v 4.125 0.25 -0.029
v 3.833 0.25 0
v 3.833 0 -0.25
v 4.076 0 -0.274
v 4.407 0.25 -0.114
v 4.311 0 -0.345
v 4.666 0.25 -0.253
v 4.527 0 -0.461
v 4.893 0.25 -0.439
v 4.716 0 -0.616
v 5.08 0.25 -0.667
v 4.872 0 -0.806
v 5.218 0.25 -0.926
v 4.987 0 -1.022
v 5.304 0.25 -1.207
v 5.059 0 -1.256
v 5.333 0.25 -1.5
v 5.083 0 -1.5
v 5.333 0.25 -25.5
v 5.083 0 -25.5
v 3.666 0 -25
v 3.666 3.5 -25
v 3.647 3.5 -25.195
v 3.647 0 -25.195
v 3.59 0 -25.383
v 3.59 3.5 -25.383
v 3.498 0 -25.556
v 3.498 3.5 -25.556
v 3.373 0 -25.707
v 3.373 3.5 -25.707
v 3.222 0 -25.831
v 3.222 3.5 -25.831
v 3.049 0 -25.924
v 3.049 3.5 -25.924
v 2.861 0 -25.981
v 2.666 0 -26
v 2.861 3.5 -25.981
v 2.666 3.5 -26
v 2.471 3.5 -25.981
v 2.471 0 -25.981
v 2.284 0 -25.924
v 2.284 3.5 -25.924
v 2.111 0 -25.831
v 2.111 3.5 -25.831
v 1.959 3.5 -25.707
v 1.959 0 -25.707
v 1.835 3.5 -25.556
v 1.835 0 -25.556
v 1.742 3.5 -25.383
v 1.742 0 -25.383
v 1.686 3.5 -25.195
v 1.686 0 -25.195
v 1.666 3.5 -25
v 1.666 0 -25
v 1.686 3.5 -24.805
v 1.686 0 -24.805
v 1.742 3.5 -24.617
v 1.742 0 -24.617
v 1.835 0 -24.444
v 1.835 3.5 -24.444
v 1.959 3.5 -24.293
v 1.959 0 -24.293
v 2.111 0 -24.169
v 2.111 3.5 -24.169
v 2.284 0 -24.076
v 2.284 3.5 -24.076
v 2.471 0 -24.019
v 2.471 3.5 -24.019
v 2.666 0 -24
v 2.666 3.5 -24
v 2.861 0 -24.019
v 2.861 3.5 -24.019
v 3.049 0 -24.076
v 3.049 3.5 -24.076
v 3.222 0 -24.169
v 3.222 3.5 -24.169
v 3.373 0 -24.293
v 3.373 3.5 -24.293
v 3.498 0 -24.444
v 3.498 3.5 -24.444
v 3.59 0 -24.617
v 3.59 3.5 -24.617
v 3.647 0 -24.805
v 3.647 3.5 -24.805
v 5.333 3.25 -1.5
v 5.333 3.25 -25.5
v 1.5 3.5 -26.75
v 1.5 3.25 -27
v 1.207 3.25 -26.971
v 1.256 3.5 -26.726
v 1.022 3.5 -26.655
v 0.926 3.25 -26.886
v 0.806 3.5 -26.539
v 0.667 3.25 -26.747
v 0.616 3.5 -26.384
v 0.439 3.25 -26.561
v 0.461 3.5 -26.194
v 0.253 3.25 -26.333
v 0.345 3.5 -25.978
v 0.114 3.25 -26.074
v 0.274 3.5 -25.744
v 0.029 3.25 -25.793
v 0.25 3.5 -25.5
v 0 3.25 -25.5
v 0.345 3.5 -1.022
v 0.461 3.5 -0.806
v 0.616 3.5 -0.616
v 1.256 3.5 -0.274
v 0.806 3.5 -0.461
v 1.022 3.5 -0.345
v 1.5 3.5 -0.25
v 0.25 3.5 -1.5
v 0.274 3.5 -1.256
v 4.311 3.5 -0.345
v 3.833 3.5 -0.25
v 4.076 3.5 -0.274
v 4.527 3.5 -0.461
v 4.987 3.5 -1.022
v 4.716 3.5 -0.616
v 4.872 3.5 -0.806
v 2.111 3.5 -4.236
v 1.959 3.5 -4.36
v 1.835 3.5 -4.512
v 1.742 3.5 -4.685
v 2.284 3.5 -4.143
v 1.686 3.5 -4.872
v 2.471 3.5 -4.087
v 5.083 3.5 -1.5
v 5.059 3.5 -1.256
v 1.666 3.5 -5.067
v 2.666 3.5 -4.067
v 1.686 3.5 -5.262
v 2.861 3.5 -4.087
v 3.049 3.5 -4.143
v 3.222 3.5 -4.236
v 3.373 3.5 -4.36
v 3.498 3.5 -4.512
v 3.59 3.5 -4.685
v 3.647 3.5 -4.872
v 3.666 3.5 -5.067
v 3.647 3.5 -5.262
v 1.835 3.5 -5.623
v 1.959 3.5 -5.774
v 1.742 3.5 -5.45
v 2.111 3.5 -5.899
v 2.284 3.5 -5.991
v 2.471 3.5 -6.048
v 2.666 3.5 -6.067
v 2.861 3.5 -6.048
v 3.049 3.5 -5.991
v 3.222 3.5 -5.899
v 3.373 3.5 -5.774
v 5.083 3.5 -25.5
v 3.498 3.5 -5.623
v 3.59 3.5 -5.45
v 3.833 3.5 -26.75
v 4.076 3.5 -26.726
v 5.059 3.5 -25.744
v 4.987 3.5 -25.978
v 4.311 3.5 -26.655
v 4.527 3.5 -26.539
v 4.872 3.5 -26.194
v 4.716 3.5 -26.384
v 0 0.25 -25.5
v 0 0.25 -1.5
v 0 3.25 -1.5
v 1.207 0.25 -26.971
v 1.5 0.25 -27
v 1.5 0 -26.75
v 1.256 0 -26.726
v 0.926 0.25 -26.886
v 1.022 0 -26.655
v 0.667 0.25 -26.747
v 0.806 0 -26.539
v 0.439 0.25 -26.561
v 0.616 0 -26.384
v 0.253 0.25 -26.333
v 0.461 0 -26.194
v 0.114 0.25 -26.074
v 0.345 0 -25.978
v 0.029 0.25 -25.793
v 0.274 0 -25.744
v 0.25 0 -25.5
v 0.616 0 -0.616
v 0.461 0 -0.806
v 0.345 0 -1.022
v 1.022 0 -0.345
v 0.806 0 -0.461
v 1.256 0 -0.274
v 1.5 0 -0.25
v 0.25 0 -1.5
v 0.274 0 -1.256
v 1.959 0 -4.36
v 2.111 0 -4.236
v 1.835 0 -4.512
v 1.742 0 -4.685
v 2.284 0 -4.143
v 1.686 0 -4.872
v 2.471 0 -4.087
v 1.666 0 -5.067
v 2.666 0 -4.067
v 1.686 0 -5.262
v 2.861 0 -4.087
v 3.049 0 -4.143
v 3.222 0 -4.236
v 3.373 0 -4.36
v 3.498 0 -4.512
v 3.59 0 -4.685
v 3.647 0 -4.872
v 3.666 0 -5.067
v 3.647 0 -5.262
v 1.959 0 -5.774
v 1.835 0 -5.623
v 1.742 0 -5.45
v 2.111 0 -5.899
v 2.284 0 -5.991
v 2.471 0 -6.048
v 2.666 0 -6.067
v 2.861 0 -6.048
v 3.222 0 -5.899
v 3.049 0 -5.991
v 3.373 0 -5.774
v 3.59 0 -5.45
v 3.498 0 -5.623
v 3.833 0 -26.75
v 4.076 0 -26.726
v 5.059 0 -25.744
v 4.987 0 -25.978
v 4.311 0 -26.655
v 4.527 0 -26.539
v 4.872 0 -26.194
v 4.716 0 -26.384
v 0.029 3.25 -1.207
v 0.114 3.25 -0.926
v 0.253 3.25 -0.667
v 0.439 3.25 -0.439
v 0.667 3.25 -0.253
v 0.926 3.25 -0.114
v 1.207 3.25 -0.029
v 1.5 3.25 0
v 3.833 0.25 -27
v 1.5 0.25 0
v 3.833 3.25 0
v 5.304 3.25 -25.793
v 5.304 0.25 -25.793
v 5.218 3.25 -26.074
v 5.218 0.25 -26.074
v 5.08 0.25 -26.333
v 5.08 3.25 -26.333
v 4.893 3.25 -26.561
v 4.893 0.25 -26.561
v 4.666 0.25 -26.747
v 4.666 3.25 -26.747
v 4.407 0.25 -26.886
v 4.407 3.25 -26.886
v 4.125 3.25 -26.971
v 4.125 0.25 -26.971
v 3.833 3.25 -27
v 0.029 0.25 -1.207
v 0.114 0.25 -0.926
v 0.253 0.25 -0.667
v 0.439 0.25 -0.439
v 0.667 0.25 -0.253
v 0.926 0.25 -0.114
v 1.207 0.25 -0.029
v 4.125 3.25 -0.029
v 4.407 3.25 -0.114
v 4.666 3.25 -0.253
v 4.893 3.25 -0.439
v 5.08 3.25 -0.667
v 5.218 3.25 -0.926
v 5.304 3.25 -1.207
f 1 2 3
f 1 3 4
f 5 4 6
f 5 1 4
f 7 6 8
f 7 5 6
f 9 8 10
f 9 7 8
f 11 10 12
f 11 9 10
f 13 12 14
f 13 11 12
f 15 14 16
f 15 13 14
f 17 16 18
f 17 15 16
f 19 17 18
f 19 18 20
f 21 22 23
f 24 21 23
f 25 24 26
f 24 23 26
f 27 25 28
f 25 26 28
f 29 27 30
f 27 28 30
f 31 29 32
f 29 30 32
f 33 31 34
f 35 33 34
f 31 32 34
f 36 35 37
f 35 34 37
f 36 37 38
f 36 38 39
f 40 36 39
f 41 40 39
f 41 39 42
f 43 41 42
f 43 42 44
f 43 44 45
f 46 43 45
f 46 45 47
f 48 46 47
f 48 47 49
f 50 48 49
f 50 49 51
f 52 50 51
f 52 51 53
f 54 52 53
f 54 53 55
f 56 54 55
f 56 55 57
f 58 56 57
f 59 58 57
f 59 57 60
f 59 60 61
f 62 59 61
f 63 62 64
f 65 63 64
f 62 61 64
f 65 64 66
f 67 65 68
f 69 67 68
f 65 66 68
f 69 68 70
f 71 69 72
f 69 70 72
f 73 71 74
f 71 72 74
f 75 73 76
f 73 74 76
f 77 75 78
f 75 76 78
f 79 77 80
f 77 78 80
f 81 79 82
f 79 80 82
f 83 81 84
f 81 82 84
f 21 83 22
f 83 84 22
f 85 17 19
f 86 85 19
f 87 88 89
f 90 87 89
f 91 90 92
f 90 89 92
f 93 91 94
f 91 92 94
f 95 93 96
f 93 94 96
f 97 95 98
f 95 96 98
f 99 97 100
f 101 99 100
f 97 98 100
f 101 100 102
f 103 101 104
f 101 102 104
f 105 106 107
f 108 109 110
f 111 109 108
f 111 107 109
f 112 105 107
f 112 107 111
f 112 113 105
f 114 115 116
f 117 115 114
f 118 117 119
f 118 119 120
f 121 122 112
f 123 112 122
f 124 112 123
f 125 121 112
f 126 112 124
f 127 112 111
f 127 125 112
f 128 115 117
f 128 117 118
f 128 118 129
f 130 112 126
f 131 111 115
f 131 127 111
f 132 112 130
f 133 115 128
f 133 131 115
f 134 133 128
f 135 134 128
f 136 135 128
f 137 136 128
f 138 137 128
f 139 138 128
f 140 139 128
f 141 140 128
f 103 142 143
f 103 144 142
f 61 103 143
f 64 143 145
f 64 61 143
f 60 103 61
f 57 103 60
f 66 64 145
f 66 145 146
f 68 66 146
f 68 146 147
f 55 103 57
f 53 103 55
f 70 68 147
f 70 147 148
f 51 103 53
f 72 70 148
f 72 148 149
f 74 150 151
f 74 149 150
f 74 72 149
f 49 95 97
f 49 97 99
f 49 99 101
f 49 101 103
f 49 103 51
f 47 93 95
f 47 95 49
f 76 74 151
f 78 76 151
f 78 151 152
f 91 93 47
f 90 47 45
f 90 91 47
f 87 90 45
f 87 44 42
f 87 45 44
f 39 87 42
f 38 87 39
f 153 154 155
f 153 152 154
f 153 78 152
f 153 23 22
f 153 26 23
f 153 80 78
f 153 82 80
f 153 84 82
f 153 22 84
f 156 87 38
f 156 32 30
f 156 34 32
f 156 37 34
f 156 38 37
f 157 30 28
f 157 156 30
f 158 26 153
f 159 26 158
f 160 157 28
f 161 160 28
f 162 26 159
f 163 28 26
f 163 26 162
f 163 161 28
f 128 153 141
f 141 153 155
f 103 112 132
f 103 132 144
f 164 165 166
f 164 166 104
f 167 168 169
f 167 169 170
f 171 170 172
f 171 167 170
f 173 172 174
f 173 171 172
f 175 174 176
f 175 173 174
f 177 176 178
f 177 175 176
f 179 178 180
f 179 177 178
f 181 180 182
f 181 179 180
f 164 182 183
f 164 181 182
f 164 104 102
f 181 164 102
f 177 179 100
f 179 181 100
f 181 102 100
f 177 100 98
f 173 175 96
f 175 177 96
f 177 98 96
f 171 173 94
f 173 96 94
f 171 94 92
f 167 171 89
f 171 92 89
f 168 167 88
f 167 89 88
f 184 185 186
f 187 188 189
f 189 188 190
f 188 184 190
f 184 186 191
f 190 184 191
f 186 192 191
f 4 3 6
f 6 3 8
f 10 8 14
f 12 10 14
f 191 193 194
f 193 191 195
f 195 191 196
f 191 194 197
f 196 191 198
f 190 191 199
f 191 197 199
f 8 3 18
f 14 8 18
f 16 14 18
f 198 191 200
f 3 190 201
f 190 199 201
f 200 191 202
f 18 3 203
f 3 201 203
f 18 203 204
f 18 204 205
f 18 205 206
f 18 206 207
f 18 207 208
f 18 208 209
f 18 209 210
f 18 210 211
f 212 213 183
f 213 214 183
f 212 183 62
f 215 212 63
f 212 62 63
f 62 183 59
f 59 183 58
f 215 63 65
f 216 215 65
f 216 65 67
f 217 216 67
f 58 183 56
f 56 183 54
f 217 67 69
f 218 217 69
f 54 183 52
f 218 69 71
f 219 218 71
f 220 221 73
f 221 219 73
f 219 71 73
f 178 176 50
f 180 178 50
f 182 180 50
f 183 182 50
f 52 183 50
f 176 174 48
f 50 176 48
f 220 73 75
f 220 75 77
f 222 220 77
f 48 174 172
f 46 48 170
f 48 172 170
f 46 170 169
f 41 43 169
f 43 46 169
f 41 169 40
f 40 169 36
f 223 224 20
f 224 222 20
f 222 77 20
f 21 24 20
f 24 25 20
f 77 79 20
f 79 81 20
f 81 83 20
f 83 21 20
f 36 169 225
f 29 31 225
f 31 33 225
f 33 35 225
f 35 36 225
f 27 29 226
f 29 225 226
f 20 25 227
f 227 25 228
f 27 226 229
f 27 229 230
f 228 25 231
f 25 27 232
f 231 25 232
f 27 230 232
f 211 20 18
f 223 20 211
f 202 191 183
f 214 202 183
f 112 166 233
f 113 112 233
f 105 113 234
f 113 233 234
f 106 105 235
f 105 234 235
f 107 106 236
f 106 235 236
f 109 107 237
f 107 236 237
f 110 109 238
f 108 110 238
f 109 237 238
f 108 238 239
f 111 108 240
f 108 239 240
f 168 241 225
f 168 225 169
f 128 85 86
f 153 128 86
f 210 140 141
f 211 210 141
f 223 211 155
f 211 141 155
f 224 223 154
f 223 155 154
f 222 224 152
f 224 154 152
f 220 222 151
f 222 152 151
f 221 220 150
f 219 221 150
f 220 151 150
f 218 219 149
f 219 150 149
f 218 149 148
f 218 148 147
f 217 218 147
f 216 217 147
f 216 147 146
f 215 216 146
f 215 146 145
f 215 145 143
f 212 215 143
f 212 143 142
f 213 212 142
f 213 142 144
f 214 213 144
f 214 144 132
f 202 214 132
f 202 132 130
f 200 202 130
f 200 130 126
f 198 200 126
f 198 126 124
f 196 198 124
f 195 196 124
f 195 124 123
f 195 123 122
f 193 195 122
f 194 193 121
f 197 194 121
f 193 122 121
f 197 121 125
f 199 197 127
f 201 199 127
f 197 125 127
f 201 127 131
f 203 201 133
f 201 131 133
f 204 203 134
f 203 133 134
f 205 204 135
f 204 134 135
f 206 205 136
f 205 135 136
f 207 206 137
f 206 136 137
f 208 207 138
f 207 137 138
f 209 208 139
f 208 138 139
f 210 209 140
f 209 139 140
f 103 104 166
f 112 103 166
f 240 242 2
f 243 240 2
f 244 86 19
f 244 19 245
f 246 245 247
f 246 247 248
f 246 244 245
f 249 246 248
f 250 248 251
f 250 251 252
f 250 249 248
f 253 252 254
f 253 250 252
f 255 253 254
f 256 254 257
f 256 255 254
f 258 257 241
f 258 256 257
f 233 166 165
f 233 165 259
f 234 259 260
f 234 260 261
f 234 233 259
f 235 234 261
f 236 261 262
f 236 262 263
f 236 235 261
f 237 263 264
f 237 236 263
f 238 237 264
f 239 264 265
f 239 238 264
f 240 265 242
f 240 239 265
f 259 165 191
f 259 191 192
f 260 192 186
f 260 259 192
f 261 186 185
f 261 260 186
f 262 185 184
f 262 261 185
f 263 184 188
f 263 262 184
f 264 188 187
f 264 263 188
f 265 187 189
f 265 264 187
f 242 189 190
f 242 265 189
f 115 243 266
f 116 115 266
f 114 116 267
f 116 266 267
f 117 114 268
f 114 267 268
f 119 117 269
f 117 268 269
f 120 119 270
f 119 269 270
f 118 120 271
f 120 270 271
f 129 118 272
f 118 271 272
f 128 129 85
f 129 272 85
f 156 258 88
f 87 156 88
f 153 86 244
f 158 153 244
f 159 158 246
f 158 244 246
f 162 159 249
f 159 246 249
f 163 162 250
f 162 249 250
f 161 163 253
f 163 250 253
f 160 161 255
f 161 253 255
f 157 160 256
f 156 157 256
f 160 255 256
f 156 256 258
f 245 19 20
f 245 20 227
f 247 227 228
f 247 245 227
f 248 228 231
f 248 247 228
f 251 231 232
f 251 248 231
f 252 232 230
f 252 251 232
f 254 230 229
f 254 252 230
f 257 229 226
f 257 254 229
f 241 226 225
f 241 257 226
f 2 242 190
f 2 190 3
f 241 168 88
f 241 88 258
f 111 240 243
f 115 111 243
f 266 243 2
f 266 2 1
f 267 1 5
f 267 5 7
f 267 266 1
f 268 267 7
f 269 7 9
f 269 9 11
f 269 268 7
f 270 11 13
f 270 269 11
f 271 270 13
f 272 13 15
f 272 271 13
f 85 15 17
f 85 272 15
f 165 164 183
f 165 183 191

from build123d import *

# Parameters (mm, degrees)
SKETCH_1_W          = 5.332575
SKETCH_1_H          = 27
EXTRUDE_1_DEPTH     = 3.5
FILLET_1_R          = 1.5
SKETCH_2_R          = 1
CUT_EXTRUDE_1_DEPTH = 4.5
CHAMFER_1_SIZE      = 0.25


with BuildPart() as part:
    # ｽｹｯﾁ1 → ﾎﾞｽ - 押し出し1 (new body)
    with BuildSketch(Plane(origin=(0, 0, 0), x_dir=(1, 0, 0), z_dir=(0, 1, 0))):
        with Locations((2.6662875, 13.5)):
            Rectangle(SKETCH_1_W, SKETCH_1_H)
    extrude(amount=EXTRUDE_1_DEPTH)

    # ﾌｨﾚｯﾄ1
    fillet_1_edges = [part.edges().sort_by_distance(p)[0] for p in [
        (5.332575, 1.75, -27),
        (5.332575, 1.75, 0),
        (0, 1.75, 0),
        (0, 1.75, -27),
    ]]
    fillet(fillet_1_edges, radius=FILLET_1_R)

    # ｽｹｯﾁ2 → ｶｯﾄ - 押し出し1 (cut, through all)
    with BuildSketch(Plane(origin=(0, 3.5, 0), x_dir=(1, 0, 0), z_dir=(0, 1, 0))):
        with Locations((2.6662875, 25)):
            Circle(SKETCH_2_R)
        with Locations((2.6662875, 5.06736)):
            Circle(SKETCH_2_R)
    extrude(amount=-CUT_EXTRUDE_1_DEPTH, mode=Mode.SUBTRACT)

    # 面取り1
    chamfer_1_edges = [part.edges().sort_by_distance(p)[0] for p in [
        (5.332575, 0, -13.5),
        (5.332575, 3.5, -13.5),
        (2.6662875, 0, -27),
        (2.6662875, 0, 0),
        (0, 0, -13.5),
        (4.893235172, 0, -26.560660172),
        (0.439339828, 0, -26.560660172),
        (0.439339828, 0, -0.439339828),
        (4.893235172, 0, -0.439339828),
        (2.6662875, 3.5, 0),
        (2.6662875, 3.5, -27),
        (0, 3.5, -13.5),
        (4.893235172, 3.5, -26.560660172),
        (0.439339828, 3.5, -26.560660172),
        (0.439339828, 3.5, -0.439339828),
        (4.893235172, 3.5, -0.439339828),
    ]]
    chamfer(chamfer_1_edges, length=CHAMFER_1_SIZE)


solid = part.part
